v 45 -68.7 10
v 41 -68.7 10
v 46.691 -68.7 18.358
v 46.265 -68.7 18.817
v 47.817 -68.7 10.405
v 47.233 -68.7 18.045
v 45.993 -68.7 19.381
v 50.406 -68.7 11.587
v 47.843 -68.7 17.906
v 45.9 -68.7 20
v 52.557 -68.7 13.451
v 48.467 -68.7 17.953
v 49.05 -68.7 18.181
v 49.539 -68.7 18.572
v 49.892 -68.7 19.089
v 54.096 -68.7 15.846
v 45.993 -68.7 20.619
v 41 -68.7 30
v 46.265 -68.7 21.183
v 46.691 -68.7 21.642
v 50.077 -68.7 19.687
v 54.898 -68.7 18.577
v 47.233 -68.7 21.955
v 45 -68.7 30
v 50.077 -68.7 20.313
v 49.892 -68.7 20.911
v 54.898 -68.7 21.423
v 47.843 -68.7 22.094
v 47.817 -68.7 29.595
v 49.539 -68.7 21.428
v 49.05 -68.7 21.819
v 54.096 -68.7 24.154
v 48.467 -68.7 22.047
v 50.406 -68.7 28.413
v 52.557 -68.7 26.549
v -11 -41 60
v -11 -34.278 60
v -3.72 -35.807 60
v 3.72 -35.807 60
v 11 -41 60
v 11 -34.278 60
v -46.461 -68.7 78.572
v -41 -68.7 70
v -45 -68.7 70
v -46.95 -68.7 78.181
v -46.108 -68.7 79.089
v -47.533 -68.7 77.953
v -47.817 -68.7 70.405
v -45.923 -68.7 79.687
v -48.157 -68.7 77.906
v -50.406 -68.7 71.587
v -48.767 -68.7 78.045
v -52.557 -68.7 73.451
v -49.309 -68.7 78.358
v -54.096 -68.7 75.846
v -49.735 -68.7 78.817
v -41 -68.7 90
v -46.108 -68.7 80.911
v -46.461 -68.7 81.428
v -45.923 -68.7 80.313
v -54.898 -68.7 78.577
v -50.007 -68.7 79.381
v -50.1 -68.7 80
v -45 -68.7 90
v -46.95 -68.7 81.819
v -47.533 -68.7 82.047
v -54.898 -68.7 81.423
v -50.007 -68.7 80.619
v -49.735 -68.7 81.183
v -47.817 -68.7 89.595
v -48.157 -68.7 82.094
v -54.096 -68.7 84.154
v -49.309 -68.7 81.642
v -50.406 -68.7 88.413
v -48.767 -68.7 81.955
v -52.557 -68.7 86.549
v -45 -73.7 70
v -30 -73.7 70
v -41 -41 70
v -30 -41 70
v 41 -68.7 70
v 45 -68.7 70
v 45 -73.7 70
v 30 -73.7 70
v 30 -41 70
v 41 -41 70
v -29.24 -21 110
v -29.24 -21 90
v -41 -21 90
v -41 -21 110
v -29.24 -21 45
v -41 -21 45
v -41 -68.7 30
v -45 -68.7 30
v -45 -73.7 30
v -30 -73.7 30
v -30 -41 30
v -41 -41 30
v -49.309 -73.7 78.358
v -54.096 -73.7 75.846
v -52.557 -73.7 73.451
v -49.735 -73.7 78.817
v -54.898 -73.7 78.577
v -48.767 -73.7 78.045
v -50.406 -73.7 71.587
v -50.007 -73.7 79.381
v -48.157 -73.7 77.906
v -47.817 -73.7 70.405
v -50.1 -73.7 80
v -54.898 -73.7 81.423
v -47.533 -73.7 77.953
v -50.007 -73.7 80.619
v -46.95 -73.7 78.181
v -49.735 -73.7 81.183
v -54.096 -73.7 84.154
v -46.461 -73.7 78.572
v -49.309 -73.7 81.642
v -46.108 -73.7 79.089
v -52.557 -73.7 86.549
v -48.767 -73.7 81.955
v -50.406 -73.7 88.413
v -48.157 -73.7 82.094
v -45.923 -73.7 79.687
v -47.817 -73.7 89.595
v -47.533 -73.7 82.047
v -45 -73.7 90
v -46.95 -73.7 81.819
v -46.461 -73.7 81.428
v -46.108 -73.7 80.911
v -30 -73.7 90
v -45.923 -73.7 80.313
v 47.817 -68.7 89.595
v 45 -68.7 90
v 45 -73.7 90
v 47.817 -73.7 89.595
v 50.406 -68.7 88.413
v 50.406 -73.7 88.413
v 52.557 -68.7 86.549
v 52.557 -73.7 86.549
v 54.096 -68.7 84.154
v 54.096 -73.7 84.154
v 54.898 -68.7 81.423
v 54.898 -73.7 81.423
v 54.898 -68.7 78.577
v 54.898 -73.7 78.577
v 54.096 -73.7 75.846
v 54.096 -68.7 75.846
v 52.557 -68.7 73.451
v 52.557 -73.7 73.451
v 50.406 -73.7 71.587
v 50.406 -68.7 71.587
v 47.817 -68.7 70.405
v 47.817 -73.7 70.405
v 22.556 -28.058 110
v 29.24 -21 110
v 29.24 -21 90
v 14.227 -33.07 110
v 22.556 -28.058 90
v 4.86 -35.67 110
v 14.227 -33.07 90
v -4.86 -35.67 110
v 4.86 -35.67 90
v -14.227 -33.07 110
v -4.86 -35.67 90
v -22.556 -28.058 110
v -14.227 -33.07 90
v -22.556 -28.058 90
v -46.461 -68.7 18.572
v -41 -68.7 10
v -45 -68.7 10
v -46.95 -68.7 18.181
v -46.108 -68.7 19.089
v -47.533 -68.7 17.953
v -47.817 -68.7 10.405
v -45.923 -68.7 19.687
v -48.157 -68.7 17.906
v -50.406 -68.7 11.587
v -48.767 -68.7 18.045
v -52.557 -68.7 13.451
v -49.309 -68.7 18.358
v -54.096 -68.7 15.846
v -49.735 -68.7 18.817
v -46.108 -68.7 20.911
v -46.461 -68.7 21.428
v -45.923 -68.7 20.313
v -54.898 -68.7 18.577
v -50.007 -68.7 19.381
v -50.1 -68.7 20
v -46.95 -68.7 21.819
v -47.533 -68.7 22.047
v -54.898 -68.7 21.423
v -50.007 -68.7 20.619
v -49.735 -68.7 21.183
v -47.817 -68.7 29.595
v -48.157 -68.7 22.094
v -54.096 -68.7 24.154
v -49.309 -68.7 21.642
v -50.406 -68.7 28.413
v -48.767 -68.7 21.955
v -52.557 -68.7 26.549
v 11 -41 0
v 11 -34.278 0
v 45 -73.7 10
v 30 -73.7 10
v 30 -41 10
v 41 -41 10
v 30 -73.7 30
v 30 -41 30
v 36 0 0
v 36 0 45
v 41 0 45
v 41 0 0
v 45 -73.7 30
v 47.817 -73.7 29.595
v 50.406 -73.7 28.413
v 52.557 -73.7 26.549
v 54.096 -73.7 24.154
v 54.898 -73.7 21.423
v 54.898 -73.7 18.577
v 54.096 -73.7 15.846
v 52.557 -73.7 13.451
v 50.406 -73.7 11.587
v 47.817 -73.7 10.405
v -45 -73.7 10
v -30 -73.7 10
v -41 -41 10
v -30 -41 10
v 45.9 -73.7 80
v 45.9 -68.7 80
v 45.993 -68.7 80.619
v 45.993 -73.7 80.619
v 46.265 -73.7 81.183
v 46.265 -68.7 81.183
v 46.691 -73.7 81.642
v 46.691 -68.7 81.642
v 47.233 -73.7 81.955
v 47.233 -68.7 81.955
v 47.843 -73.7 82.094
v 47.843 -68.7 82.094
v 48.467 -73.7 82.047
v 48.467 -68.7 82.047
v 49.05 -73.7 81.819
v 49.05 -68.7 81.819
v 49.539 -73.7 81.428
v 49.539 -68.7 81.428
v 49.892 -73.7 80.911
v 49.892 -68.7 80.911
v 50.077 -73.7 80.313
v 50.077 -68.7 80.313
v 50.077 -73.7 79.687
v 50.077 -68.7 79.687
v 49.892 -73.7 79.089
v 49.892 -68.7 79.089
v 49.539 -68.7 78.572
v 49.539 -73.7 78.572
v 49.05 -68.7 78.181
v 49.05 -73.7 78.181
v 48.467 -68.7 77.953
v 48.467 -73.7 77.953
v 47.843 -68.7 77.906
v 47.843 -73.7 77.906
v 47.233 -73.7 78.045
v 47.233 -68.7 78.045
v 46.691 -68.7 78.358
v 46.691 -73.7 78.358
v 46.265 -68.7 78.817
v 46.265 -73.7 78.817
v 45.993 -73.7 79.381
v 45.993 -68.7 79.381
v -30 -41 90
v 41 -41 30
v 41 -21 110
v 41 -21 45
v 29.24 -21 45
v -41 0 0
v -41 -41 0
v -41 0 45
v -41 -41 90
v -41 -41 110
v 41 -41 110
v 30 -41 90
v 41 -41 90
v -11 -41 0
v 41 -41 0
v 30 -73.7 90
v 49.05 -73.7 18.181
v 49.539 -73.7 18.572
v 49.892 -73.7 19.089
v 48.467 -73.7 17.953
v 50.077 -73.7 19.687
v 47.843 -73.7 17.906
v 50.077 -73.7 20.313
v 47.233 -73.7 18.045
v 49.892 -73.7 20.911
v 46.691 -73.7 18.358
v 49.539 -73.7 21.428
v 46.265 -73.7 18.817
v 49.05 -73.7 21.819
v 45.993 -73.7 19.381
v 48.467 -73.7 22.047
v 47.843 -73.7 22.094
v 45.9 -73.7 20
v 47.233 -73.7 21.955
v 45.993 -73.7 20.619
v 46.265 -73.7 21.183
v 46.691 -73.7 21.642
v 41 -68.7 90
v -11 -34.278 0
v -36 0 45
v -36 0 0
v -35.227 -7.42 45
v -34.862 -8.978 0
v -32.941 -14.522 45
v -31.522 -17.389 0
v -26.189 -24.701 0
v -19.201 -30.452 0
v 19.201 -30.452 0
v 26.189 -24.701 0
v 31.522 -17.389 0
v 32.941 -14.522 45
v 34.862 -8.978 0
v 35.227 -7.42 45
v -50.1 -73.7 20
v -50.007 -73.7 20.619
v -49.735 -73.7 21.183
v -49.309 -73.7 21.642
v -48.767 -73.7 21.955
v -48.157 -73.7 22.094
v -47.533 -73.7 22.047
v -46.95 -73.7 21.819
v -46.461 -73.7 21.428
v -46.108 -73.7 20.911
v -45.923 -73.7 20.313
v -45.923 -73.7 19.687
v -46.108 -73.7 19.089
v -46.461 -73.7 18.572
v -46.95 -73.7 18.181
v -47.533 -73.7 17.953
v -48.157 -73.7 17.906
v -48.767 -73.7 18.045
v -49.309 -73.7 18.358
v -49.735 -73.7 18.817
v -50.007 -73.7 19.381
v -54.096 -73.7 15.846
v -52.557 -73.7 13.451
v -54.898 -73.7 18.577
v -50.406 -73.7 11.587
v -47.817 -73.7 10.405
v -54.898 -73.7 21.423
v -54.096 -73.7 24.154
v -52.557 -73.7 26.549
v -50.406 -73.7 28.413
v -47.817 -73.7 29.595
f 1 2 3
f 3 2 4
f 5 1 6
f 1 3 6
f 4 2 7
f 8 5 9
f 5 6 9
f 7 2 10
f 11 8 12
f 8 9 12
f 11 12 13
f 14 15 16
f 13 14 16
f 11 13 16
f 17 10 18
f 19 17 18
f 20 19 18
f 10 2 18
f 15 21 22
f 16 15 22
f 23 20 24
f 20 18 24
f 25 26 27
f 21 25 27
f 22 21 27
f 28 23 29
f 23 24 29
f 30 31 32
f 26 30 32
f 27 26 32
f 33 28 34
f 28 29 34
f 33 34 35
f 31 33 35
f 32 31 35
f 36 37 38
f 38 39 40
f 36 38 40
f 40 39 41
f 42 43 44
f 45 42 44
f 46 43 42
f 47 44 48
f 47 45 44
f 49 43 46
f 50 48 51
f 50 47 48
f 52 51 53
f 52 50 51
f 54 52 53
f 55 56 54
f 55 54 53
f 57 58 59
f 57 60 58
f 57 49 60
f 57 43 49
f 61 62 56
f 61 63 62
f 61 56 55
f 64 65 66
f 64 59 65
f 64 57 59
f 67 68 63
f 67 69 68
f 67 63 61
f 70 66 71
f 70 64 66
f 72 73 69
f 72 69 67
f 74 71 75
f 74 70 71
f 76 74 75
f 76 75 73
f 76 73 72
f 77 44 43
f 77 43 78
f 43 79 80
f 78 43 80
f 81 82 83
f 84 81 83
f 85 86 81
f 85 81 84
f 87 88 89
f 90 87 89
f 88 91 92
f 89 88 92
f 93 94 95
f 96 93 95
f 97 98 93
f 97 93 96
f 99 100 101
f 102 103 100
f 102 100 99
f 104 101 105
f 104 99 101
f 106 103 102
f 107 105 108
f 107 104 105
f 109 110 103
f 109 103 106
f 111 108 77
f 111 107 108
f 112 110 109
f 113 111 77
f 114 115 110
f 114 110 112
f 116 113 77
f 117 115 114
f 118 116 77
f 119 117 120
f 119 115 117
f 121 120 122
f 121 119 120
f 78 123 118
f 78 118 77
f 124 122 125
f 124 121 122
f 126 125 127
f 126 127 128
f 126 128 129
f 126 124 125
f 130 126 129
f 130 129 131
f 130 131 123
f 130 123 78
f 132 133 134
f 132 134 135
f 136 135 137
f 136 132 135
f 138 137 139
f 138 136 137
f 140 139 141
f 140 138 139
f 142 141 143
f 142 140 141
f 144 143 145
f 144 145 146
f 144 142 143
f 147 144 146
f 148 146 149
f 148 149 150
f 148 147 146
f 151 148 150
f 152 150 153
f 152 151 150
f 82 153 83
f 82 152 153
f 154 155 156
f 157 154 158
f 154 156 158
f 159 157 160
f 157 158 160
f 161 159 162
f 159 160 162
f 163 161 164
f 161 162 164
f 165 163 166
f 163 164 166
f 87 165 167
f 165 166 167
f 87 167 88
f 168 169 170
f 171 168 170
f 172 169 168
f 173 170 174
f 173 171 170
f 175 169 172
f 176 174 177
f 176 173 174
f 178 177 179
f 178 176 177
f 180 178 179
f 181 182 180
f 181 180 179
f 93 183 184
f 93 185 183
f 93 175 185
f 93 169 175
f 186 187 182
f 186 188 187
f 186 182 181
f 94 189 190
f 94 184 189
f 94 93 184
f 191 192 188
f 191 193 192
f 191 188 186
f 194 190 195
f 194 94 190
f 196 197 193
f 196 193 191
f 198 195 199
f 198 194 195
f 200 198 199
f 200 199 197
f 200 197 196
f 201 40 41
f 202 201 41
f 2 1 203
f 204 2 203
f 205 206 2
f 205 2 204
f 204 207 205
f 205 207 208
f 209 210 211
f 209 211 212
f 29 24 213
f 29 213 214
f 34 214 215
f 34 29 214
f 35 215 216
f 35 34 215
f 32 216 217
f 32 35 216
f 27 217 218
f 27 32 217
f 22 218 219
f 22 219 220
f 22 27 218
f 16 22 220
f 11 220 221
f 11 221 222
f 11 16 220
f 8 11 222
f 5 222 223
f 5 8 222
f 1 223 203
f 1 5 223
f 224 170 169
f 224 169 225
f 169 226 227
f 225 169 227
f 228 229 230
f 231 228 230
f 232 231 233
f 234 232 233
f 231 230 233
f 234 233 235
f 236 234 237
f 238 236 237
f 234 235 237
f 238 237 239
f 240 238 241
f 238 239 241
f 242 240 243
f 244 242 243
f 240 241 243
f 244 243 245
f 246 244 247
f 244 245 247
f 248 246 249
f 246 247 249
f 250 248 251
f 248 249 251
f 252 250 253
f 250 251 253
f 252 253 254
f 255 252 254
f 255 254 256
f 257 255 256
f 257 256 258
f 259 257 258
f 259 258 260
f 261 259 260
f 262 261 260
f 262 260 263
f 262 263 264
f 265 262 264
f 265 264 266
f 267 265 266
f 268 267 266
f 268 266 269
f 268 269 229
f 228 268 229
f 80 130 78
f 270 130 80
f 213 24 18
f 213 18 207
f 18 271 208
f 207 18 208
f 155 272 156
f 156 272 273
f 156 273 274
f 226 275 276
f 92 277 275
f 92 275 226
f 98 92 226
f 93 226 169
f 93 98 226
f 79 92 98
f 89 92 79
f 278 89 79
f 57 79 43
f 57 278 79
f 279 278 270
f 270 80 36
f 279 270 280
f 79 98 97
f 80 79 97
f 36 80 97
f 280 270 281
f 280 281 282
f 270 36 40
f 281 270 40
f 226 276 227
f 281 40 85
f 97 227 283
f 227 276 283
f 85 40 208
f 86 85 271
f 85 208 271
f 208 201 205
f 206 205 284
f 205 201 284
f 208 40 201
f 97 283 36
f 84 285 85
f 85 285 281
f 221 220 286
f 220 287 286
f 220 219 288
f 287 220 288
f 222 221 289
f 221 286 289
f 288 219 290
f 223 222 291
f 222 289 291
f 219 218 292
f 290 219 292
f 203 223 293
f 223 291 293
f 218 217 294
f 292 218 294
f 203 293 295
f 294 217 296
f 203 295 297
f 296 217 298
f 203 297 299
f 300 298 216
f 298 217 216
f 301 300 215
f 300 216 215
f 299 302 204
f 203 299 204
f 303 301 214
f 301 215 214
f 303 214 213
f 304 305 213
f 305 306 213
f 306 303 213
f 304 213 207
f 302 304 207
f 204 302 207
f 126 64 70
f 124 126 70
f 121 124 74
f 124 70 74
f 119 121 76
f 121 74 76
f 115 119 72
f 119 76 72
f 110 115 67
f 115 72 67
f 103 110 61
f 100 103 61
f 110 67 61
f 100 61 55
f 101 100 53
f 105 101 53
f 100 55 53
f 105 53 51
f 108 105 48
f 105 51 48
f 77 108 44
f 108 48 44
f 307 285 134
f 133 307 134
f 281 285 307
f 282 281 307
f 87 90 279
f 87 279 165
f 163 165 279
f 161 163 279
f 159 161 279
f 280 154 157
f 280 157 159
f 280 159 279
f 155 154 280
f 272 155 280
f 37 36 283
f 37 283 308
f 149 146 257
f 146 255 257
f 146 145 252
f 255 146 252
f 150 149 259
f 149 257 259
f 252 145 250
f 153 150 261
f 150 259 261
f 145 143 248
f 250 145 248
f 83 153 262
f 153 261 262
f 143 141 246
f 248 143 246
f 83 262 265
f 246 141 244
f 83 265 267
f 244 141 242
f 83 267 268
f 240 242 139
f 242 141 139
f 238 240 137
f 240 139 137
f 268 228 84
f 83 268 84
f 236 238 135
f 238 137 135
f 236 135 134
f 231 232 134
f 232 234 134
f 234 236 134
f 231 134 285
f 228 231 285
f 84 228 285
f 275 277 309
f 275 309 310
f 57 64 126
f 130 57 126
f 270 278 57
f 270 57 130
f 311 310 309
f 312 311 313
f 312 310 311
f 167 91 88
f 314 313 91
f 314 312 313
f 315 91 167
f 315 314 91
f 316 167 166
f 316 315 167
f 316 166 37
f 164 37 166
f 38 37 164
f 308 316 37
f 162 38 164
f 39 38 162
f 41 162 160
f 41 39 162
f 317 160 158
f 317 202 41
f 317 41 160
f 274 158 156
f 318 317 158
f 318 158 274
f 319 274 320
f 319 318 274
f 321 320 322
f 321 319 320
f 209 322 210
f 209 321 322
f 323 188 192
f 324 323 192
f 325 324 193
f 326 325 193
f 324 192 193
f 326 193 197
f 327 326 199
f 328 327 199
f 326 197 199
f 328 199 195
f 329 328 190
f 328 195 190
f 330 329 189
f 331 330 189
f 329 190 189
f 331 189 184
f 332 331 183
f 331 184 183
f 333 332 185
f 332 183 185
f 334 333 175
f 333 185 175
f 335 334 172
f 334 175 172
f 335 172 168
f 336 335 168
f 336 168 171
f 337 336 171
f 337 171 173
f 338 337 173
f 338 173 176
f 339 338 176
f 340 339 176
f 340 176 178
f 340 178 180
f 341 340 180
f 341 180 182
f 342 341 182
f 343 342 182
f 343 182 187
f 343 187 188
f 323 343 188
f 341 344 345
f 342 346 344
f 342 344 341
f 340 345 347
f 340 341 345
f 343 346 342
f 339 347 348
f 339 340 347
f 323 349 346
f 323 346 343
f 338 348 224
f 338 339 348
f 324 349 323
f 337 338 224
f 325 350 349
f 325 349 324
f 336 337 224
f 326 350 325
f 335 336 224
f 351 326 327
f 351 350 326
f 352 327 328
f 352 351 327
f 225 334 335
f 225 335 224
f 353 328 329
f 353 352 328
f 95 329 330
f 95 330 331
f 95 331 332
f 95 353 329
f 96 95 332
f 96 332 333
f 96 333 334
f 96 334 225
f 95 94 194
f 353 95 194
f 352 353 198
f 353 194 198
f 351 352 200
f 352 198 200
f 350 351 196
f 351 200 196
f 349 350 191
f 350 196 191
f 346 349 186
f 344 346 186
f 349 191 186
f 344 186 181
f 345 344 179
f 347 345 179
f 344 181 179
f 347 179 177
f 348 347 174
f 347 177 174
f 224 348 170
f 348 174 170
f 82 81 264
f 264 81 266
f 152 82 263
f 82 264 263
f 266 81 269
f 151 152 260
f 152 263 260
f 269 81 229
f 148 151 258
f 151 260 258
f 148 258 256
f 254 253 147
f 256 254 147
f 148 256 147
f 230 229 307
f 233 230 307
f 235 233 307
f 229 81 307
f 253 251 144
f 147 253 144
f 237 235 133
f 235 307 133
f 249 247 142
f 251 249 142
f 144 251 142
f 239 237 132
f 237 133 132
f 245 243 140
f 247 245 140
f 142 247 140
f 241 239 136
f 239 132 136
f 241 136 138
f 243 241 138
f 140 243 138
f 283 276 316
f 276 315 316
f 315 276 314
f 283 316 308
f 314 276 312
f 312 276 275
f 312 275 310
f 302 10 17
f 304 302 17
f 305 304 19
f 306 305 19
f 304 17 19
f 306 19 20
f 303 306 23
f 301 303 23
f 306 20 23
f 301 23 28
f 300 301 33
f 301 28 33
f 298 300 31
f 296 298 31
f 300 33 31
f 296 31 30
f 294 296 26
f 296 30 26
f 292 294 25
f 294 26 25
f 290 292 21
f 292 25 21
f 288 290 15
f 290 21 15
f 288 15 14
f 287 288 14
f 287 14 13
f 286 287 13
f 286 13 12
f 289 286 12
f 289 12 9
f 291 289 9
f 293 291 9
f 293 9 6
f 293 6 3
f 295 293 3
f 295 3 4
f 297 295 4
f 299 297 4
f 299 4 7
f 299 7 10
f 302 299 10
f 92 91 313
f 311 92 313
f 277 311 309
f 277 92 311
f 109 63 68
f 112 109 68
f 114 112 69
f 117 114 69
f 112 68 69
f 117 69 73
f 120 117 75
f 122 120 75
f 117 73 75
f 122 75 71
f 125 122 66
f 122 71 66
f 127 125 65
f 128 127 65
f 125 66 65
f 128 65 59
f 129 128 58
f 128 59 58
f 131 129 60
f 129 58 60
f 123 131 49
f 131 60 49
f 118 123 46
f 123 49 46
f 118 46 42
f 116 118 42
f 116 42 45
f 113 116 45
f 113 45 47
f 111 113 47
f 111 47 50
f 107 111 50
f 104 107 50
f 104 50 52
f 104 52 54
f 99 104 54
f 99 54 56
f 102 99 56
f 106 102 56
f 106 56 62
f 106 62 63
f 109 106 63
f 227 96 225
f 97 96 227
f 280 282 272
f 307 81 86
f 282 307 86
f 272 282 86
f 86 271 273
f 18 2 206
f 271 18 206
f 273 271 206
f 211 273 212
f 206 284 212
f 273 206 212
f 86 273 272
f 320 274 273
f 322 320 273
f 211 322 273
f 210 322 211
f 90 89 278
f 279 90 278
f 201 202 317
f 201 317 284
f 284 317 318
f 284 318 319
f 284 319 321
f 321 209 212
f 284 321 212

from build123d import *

# Parameters (mm, degrees)
SKETCH_1_R               = 36
EXTRUDE_1_DEPTH          = 90
SKETCH_2_W               = 22
SKETCH_2_H               = 6.721726998
CUT_EXTRUDE_1_DEPTH      = 60
CUT_EXTRUDE_2_DEPTH      = 108.060730429
CUT_EXTRUDE_2_DEPTH_BACK = 108.060730429
EXTRUDE_3_DEPTH          = 20
SKETCH_5_R               = 2.1
CUT_EXTRUDE_3_DEPTH      = 126.87569265
PATTERN_LINEAR_1_COUNT   = 2
PATTERN_LINEAR_1_PITCH   = 60
EXTRUDE_4_DEPTH          = 20


with BuildPart() as part:
    # 草圖1 → 填料-伸長1 (new body)
    with BuildSketch(Plane.XY):
        with BuildLine():
            Line((-41, 0), (-41, -41))
            Line((-41, -41), (41, -41))
            Line((41, -41), (41, 0))
            ThreePointArc((41, 0), (0, 41), (-41, 0))
        make_face()
        with Locations(Location((0, 0, 0), (0, 0, 180))):
            Circle(SKETCH_1_R, mode=Mode.SUBTRACT)
    extrude(amount=EXTRUDE_1_DEPTH)

    # 草圖2 → 除料-伸長1 (cut)
    with BuildSketch(Plane.XY):
        with Locations((0, -37.639136501)):
            Rectangle(SKETCH_2_W, SKETCH_2_H)
    extrude(amount=CUT_EXTRUDE_1_DEPTH, mode=Mode.SUBTRACT)

    # 草圖3 → 除料-伸長2 (cut, two sides: drawn at the far end of the back side and taken through both)
    with BuildSketch(Plane(origin=(0, 0, 0), x_dir=(0, 0, -1), z_dir=(1, 0, 0)).offset(-CUT_EXTRUDE_2_DEPTH_BACK)):
        Polygon((0, 41), (-90, 41), (-90, -21), (-45, -21), (-45, 0), (0, 0), align=None)
    extrude(amount=CUT_EXTRUDE_2_DEPTH + CUT_EXTRUDE_2_DEPTH_BACK, mode=Mode.SUBTRACT)

    # 草圖4 → 填料-伸長3 (add)
    with BuildSketch(Plane.XY.offset(90)):
        with BuildLine():
            Line((-30, -73.7), (-30, -27.946386022))
            ThreePointArc((-30, -27.946386022), (-32.791276328, -24.611637258), (-35.213640705, -21))
            Line((-35.213640705, -21), (-41, -21))
            Line((-41, -21), (-41, -68.7))
            Line((-41, -68.7), (-55, -68.7))
            Line((-55, -68.7), (-55, -73.7))
            Line((-55, -73.7), (-30, -73.7))
        make_face()
        with BuildLine():
            Line((30, -73.7), (30, -27.946386022))
            ThreePointArc((30, -27.946386022), (32.791276328, -24.611637258), (35.213640705, -21))
            Line((35.213640705, -21), (41, -21))
            Line((41, -21), (41, -68.7))
            Line((41, -68.7), (55, -68.7))
            Line((55, -68.7), (55, -73.7))
            Line((55, -73.7), (30, -73.7))
        make_face()
    extrude_3 = extrude(amount=-EXTRUDE_3_DEPTH)

    # 草圖5 → 除料-伸長3 (cut, through all)
    with BuildSketch(Plane(origin=(0, -68.7, 0), x_dir=(1, 0, 0), z_dir=(0, 1, 0))):
        with Locations(Location((-48, -80, 0), (0, 0, 180))):
            Circle(SKETCH_5_R)
        with Locations(Location((48, -80, 0), (0, 0, 180))):
            Circle(SKETCH_5_R)
        with BuildLine():
            Line((45, -70), (45, -66.851466146))
            Line((45, -66.851466146), (57.675759509, -66.851466146))
            Line((57.675759509, -66.851466146), (57.675759509, -92.046945096))
            Line((57.675759509, -92.046945096), (45, -92.046945096))
            Line((45, -92.046945096), (45, -90))
            ThreePointArc((45, -90), (55, -80), (45, -70))
        make_face()
        with BuildLine():
            Line((-57.675759509, -92.046945096), (-45, -92.046945096))
            Line((-45, -92.046945096), (-45, -90))
            ThreePointArc((-45, -90), (-55, -80), (-45, -70))
            Line((-45, -70), (-45, -66.851466146))
            Line((-45, -66.851466146), (-57.675759509, -66.851466146))
            Line((-57.675759509, -66.851466146), (-57.675759509, -92.046945096))
        make_face()
    cut_extrude_3 = extrude(amount=-CUT_EXTRUDE_3_DEPTH, mode=Mode.SUBTRACT)

    # 直線複製排列1: 填料-伸長3, 除料-伸長3 ×2
    with Locations(*[(0, 0, -i * PATTERN_LINEAR_1_PITCH) for i in range(1, PATTERN_LINEAR_1_COUNT)]):
        add(extrude_3)
        add(cut_extrude_3, mode=Mode.SUBTRACT)

    # 草圖6 → 填料-伸長4 (add)
    with BuildSketch(Plane.XY.offset(90)):
        with BuildLine():
            Line((-29.240383034, -21), (-41.000001526, -21))
            Line((-41.000001526, -21), (-41, -41))
            Line((-41, -41), (41, -41))
            Line((41, -41), (41, -21))
            Line((41, -21), (29.240383034, -21))
            ThreePointArc((29.240383034, -21), (0, -36), (-29.240383034, -21))
        make_face()
    extrude(amount=EXTRUDE_4_DEPTH)


solid = part.part
